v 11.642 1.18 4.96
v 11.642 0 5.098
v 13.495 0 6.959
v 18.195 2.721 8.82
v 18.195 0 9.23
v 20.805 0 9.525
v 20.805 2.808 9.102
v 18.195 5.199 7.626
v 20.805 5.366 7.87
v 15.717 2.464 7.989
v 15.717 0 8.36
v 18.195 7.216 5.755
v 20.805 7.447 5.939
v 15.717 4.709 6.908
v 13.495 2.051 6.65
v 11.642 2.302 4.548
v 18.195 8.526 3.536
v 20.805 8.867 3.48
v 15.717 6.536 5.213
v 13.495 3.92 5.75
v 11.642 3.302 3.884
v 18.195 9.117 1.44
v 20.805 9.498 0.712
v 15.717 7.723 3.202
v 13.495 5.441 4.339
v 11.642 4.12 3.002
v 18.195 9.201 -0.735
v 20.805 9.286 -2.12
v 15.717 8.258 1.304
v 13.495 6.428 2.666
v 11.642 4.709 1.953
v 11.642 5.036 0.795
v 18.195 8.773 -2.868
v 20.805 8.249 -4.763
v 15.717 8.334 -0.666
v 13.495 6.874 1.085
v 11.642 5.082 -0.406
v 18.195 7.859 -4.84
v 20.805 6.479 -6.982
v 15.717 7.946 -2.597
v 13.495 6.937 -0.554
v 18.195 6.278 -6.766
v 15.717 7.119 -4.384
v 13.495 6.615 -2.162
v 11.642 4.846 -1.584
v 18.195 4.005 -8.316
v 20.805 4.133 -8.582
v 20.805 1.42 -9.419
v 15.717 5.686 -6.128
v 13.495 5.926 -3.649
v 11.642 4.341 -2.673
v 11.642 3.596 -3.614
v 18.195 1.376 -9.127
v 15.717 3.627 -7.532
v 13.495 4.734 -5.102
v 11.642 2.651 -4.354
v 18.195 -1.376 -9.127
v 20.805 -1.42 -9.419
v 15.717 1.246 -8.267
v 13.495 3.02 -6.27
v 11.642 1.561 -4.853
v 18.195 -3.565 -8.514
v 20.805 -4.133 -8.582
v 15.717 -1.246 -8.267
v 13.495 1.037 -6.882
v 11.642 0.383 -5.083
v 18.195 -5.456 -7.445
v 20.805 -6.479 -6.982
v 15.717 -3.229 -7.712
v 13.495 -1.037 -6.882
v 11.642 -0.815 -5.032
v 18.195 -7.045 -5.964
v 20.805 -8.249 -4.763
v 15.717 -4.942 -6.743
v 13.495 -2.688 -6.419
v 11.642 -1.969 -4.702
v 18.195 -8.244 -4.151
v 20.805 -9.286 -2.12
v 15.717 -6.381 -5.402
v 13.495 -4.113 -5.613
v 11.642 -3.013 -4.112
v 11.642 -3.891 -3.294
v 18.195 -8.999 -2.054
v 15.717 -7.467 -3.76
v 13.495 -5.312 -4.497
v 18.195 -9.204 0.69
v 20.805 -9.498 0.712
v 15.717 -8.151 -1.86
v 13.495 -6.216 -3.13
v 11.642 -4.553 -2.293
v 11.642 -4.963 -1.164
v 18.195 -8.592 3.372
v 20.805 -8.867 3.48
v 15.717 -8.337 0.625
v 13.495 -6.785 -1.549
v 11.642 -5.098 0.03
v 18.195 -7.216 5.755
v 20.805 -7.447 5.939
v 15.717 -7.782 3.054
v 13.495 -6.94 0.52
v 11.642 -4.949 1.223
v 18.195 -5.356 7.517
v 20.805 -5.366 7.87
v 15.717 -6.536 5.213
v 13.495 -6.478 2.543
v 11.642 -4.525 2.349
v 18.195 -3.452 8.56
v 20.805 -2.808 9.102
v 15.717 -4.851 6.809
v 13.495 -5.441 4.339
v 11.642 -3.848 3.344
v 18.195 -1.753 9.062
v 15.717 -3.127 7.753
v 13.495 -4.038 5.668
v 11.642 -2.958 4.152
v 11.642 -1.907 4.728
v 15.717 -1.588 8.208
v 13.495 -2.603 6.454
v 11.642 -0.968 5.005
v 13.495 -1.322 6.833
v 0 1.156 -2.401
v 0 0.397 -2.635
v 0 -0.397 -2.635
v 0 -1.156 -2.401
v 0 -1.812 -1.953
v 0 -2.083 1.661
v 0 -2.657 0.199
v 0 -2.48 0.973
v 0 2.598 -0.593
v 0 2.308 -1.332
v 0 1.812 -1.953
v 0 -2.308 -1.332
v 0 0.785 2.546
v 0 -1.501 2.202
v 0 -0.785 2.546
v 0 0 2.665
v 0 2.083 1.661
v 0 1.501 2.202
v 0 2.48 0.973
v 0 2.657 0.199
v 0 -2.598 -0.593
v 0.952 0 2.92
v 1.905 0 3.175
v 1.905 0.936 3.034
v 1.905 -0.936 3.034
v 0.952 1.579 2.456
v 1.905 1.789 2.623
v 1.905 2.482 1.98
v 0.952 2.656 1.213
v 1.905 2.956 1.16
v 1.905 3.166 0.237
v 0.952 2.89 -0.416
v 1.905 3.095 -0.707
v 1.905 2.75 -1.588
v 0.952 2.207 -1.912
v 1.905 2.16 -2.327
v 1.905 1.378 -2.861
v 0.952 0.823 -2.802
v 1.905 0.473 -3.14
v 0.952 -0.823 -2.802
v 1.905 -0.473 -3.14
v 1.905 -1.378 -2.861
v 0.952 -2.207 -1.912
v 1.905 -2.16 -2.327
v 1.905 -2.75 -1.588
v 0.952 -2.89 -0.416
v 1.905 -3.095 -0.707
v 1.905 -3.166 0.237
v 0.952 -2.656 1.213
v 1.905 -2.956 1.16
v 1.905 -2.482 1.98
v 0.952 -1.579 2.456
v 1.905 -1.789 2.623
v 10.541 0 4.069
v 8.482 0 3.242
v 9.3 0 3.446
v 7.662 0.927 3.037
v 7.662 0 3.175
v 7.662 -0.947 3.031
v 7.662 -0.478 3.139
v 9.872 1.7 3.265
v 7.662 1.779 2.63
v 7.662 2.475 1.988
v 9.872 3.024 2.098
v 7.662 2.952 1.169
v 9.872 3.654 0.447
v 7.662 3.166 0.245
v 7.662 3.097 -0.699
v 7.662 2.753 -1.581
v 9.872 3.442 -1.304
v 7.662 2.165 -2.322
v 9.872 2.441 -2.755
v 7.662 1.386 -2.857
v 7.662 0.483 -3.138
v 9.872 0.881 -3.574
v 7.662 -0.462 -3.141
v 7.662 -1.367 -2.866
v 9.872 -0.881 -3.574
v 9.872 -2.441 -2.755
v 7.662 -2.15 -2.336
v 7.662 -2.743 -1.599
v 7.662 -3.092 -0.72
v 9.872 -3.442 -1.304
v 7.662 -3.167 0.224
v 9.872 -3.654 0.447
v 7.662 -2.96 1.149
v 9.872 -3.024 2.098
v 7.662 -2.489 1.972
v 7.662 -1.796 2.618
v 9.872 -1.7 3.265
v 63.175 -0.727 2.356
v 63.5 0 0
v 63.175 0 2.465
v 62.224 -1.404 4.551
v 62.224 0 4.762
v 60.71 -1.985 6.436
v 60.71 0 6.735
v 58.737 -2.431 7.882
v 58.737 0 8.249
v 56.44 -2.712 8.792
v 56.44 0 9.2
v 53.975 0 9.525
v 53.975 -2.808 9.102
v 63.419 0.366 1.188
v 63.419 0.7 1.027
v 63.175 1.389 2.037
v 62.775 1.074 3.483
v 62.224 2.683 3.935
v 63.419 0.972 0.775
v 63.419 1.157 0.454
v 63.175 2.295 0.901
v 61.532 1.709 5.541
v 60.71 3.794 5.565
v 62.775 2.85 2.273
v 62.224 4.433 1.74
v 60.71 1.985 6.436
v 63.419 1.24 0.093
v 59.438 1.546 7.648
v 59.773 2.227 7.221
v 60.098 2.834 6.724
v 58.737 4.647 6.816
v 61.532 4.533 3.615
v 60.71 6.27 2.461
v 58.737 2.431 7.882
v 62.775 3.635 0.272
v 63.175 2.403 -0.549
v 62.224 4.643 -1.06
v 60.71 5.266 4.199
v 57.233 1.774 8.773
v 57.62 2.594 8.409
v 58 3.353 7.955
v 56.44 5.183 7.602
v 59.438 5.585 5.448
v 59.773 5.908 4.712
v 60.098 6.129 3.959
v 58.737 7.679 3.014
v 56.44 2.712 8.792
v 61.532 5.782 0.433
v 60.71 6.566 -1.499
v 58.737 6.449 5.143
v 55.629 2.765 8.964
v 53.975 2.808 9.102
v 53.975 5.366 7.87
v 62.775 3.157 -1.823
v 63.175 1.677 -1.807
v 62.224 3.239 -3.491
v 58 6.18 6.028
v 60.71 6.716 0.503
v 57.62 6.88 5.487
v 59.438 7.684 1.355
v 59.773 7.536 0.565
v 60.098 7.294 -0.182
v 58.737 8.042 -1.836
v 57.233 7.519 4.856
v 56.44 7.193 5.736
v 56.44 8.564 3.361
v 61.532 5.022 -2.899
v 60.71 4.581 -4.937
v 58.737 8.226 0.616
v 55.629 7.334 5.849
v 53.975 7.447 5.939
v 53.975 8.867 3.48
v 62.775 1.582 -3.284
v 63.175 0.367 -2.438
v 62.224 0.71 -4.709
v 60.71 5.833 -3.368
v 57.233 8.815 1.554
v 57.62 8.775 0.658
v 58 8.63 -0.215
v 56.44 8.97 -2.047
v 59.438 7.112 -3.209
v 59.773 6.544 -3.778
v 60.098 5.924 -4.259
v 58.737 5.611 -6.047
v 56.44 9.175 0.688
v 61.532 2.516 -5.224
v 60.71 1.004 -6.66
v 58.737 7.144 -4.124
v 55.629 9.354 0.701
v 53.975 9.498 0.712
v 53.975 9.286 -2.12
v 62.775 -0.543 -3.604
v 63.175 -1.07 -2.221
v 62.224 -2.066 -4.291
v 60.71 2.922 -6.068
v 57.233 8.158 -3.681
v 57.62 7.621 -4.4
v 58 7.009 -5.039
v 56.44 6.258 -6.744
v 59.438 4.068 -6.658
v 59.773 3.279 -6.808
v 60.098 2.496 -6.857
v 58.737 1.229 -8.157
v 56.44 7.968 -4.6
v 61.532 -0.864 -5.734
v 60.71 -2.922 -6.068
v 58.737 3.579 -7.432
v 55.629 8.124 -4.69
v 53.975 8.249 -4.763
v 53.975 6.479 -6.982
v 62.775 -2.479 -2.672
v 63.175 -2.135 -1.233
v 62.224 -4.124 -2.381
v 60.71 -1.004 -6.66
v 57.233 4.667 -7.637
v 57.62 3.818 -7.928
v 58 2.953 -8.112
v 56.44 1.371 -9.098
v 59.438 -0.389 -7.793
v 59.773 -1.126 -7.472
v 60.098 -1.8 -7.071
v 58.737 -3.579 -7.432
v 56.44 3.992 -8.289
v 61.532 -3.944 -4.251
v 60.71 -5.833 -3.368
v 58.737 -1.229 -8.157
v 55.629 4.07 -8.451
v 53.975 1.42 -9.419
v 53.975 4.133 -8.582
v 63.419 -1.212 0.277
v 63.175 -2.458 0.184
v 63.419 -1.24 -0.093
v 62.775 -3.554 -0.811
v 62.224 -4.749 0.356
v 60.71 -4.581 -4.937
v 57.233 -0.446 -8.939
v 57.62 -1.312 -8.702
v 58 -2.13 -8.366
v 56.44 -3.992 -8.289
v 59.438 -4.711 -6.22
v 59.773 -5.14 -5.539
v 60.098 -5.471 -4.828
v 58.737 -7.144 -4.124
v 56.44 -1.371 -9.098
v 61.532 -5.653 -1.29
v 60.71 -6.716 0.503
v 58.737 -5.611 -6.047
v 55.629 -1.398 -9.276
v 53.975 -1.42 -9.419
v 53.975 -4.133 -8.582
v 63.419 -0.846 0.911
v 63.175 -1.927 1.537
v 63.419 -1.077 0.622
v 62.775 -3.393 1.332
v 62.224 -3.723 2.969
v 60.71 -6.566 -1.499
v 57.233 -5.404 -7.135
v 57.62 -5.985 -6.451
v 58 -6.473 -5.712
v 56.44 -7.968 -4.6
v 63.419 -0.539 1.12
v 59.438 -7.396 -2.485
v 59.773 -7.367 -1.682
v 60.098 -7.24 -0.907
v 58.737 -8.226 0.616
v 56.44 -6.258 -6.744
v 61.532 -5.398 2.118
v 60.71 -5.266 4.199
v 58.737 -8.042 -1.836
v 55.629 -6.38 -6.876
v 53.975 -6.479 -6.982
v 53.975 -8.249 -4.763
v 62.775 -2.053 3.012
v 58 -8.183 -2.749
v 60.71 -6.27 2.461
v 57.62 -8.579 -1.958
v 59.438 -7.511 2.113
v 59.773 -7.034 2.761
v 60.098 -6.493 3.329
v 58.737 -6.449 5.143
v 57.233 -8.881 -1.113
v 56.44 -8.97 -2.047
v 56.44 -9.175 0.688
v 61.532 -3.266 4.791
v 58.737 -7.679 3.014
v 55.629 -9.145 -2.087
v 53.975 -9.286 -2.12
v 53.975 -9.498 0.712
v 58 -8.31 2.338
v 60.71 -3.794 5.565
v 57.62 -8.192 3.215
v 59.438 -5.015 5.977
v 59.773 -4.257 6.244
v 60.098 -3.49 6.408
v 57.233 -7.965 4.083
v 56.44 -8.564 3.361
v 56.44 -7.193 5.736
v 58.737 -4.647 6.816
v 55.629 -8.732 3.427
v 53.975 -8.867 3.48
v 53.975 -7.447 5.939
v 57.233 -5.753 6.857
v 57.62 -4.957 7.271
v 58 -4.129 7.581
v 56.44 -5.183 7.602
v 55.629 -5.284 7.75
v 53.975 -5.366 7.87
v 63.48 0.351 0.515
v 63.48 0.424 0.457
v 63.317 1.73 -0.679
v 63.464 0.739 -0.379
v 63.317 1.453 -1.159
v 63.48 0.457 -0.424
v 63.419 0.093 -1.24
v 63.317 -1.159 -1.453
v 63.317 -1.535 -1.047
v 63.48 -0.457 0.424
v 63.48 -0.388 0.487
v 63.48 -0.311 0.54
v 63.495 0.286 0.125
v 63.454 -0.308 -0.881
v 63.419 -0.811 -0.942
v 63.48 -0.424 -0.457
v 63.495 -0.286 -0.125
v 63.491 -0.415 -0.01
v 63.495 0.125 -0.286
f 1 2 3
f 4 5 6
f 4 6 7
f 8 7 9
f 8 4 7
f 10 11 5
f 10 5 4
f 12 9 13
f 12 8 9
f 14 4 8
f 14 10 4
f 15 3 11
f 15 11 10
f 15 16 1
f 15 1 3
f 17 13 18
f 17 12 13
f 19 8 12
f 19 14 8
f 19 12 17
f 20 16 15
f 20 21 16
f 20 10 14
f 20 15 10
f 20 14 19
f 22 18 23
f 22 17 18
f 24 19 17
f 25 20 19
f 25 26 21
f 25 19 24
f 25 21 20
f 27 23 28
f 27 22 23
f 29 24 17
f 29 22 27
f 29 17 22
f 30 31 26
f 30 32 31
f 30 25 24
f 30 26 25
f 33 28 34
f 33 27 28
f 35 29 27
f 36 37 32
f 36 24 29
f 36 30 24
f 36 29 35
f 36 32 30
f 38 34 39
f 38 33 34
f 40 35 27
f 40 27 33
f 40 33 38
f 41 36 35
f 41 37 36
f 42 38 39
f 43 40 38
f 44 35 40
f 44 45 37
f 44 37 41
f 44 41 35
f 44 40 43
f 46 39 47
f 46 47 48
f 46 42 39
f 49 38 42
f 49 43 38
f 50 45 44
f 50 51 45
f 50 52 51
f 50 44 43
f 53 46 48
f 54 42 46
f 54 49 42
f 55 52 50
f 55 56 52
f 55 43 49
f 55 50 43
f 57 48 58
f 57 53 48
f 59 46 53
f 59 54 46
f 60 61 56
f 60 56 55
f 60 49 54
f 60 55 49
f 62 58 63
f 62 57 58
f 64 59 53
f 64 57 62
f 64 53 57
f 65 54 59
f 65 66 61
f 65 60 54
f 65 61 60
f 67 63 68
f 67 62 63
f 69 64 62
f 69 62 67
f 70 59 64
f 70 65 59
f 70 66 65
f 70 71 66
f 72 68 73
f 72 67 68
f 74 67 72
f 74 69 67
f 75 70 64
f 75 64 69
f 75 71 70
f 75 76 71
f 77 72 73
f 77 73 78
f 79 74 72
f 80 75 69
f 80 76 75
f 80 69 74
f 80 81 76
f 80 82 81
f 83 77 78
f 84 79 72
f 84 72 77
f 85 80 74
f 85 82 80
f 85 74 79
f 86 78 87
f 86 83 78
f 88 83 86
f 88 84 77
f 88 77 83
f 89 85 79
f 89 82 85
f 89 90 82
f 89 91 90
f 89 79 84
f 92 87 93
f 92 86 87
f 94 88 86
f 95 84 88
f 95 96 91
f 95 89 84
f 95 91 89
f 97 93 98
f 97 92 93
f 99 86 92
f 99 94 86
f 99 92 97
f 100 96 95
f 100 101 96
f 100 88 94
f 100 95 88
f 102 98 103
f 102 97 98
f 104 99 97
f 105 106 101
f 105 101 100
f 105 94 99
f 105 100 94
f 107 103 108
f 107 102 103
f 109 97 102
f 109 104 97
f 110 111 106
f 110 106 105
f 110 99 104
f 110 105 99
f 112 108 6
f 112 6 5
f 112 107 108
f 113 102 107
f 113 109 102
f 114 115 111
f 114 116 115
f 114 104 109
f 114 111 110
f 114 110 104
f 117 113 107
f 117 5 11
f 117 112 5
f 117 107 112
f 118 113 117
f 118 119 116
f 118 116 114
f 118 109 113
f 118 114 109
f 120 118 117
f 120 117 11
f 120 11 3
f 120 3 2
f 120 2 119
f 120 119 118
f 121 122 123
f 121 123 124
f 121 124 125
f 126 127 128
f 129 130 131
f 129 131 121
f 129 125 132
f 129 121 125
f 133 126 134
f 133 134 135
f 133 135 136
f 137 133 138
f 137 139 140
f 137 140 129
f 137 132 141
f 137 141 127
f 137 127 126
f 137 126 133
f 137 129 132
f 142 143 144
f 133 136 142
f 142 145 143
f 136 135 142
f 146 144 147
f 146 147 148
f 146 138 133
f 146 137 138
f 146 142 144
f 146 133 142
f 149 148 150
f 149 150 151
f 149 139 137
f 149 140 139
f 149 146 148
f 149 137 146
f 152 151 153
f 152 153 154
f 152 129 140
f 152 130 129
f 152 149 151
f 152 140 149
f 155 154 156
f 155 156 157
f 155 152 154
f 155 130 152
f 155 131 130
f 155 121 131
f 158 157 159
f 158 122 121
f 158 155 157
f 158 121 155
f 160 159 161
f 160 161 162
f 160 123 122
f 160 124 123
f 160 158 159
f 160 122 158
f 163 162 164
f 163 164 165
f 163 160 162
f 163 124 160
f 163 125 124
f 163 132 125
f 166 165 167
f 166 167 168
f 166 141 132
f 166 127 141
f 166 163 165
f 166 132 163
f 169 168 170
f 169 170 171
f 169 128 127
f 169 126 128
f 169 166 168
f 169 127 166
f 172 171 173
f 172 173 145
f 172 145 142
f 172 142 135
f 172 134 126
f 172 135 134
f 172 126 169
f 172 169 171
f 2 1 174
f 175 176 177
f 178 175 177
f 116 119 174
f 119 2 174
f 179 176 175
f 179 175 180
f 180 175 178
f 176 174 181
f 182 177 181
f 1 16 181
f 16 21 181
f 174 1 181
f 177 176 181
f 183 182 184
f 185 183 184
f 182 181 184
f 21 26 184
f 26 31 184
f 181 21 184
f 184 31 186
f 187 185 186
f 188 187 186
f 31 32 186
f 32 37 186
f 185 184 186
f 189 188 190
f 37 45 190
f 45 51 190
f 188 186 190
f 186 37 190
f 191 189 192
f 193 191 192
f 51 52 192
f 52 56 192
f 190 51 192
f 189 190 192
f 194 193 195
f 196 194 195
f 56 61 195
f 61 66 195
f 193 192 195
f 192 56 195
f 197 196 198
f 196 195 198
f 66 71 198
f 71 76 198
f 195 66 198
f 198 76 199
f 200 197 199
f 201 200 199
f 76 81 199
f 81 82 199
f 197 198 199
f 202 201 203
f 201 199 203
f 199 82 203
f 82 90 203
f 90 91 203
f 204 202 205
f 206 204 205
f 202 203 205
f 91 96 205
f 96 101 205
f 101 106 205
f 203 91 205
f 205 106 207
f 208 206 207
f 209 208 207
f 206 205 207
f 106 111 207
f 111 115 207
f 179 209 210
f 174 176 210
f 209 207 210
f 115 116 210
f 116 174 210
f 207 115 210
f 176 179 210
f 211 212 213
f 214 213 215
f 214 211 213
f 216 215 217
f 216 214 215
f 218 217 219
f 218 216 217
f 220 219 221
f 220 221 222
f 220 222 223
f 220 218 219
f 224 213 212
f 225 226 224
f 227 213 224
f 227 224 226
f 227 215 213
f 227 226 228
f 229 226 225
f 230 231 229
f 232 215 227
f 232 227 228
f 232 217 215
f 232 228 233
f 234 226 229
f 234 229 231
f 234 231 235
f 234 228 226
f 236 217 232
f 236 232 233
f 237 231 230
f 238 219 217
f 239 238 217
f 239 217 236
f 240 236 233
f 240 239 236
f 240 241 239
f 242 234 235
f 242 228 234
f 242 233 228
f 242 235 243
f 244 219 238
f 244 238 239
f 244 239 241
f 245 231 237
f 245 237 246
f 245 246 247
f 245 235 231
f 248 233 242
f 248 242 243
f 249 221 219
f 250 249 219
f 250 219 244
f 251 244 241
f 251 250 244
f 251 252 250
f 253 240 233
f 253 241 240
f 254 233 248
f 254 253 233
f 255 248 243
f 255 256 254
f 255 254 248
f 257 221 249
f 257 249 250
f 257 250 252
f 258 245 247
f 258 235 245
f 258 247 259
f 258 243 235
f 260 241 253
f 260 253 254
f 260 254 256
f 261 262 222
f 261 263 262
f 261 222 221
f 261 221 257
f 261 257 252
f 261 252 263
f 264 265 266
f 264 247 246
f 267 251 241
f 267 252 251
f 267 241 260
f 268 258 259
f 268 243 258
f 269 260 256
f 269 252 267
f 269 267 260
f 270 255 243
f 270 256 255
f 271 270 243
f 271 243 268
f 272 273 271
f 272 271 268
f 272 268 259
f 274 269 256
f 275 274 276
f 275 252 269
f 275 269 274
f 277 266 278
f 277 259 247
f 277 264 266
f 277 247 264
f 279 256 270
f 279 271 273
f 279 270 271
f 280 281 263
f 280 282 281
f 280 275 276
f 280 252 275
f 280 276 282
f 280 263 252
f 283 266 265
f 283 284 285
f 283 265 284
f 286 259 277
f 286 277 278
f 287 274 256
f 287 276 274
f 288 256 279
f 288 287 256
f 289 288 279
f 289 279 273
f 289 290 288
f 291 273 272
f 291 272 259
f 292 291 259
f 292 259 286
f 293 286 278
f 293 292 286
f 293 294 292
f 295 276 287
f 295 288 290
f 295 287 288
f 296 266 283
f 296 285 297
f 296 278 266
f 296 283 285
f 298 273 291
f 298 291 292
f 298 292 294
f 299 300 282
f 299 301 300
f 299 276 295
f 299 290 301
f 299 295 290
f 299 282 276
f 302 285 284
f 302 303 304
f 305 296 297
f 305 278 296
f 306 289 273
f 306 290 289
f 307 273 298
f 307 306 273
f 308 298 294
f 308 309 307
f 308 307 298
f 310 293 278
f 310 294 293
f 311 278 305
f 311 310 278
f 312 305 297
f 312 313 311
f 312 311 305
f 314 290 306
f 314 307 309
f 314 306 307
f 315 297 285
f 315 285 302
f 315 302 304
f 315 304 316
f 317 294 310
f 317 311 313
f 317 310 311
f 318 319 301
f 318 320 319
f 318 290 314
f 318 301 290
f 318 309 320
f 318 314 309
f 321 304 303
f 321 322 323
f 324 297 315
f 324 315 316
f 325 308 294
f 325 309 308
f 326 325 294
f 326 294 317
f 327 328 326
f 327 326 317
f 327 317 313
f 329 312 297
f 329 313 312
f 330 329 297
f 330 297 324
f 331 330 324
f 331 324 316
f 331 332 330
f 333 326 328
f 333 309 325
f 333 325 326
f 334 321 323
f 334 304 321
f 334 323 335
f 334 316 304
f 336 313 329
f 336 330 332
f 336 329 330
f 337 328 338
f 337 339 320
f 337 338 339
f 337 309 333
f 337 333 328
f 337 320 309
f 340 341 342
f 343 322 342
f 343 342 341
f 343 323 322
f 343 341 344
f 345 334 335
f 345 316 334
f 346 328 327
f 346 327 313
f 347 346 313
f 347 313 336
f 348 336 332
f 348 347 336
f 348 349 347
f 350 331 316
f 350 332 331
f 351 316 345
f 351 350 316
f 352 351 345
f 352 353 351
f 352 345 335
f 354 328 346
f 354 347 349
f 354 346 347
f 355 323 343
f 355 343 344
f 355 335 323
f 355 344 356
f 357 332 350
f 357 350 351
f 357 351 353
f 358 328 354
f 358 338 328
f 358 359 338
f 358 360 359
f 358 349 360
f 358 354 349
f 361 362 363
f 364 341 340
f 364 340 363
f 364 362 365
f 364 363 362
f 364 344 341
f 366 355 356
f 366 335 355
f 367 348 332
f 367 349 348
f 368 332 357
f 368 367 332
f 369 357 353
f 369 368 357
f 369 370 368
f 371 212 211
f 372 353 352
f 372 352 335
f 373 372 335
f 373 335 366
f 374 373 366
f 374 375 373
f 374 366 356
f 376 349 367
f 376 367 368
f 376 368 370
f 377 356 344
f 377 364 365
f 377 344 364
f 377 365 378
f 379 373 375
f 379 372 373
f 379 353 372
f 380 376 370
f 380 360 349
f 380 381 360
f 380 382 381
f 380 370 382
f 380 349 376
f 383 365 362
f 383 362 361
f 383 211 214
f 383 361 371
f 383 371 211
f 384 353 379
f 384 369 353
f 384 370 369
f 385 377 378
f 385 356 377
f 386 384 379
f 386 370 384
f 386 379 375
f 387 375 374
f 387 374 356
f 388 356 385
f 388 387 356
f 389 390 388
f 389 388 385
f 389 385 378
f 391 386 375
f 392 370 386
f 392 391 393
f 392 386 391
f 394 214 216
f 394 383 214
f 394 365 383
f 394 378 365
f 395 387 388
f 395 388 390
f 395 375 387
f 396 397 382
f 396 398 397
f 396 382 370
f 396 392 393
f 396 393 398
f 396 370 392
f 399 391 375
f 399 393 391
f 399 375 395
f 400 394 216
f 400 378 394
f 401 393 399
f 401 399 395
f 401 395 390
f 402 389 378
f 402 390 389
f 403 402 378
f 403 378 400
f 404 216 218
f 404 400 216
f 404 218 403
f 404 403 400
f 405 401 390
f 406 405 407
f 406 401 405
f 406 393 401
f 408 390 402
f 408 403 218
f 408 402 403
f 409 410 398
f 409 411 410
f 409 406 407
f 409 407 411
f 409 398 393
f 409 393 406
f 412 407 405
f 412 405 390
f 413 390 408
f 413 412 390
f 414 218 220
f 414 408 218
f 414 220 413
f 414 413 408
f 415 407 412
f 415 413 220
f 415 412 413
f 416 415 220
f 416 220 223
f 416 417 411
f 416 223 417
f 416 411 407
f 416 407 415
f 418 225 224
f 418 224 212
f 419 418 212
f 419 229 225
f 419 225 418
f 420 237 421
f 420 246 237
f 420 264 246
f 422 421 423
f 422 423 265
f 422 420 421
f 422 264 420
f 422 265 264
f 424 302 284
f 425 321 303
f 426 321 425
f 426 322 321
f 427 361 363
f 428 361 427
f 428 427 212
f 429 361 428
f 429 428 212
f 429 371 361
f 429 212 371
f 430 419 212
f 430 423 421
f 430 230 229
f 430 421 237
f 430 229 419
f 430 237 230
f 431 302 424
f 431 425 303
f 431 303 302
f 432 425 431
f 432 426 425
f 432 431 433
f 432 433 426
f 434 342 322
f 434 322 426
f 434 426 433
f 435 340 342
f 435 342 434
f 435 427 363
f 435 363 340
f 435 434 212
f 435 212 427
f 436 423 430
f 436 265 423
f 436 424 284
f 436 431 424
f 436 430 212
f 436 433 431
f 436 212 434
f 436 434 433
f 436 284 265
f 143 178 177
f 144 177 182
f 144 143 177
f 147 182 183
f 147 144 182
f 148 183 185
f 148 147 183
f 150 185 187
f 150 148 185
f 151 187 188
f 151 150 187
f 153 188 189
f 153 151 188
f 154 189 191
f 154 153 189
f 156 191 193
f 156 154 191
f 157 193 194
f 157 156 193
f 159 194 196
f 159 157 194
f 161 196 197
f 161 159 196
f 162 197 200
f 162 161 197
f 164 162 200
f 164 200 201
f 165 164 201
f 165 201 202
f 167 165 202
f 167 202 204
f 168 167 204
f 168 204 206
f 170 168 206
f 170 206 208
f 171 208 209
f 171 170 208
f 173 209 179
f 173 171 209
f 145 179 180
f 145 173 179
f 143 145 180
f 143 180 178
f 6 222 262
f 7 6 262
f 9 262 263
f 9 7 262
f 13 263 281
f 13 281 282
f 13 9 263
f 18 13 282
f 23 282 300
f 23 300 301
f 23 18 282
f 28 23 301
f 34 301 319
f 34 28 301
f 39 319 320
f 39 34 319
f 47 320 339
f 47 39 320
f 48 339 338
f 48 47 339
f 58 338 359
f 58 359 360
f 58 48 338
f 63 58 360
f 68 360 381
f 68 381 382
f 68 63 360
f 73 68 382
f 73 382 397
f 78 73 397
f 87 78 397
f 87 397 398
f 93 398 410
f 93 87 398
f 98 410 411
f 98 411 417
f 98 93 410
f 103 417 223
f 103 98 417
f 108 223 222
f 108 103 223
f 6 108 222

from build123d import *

# Parameters (mm, degrees)
F2_R     = 5.08
F3_SIZE2 = 0.510443
F3_SIZE  = 1.905


with BuildPart() as f1:
    # F0 (on Front) → F1 (revolve)
    with BuildSketch(Plane.XZ):
        with BuildLine():
            Line((0, 3.175), (0, 0))
            Line((0, 0), (63.5, 0))
            ThreePointArc((63.5, 0), (60.710192, 6.735192), (53.975, 9.525))
            Line((53.975, 9.525), (20.805025, 9.525))
            ThreePointArc((20.805025, 9.525), (14.711283, 7.812062), (10.402513, 3.175))
            Line((10.402513, 3.175), (0, 3.175))
        make_face()
    revolve(axis=Axis((31.75, 0, 0), (-1, 0, 0)))

    # F2
    f2_edges = [f1.edges().sort_by_distance(p)[0] for p in [
        (10.402513, 0, -3.175),
    ]]
    fillet(f2_edges, radius=F2_R)

    # F3
    f3_edges = [f1.edges().sort_by_distance(p)[0] for p in [
        (0, 0, -3.175),
    ]]
    chamfer(f3_edges, length=F3_SIZE, length2=F3_SIZE2)


solid = f1.part
